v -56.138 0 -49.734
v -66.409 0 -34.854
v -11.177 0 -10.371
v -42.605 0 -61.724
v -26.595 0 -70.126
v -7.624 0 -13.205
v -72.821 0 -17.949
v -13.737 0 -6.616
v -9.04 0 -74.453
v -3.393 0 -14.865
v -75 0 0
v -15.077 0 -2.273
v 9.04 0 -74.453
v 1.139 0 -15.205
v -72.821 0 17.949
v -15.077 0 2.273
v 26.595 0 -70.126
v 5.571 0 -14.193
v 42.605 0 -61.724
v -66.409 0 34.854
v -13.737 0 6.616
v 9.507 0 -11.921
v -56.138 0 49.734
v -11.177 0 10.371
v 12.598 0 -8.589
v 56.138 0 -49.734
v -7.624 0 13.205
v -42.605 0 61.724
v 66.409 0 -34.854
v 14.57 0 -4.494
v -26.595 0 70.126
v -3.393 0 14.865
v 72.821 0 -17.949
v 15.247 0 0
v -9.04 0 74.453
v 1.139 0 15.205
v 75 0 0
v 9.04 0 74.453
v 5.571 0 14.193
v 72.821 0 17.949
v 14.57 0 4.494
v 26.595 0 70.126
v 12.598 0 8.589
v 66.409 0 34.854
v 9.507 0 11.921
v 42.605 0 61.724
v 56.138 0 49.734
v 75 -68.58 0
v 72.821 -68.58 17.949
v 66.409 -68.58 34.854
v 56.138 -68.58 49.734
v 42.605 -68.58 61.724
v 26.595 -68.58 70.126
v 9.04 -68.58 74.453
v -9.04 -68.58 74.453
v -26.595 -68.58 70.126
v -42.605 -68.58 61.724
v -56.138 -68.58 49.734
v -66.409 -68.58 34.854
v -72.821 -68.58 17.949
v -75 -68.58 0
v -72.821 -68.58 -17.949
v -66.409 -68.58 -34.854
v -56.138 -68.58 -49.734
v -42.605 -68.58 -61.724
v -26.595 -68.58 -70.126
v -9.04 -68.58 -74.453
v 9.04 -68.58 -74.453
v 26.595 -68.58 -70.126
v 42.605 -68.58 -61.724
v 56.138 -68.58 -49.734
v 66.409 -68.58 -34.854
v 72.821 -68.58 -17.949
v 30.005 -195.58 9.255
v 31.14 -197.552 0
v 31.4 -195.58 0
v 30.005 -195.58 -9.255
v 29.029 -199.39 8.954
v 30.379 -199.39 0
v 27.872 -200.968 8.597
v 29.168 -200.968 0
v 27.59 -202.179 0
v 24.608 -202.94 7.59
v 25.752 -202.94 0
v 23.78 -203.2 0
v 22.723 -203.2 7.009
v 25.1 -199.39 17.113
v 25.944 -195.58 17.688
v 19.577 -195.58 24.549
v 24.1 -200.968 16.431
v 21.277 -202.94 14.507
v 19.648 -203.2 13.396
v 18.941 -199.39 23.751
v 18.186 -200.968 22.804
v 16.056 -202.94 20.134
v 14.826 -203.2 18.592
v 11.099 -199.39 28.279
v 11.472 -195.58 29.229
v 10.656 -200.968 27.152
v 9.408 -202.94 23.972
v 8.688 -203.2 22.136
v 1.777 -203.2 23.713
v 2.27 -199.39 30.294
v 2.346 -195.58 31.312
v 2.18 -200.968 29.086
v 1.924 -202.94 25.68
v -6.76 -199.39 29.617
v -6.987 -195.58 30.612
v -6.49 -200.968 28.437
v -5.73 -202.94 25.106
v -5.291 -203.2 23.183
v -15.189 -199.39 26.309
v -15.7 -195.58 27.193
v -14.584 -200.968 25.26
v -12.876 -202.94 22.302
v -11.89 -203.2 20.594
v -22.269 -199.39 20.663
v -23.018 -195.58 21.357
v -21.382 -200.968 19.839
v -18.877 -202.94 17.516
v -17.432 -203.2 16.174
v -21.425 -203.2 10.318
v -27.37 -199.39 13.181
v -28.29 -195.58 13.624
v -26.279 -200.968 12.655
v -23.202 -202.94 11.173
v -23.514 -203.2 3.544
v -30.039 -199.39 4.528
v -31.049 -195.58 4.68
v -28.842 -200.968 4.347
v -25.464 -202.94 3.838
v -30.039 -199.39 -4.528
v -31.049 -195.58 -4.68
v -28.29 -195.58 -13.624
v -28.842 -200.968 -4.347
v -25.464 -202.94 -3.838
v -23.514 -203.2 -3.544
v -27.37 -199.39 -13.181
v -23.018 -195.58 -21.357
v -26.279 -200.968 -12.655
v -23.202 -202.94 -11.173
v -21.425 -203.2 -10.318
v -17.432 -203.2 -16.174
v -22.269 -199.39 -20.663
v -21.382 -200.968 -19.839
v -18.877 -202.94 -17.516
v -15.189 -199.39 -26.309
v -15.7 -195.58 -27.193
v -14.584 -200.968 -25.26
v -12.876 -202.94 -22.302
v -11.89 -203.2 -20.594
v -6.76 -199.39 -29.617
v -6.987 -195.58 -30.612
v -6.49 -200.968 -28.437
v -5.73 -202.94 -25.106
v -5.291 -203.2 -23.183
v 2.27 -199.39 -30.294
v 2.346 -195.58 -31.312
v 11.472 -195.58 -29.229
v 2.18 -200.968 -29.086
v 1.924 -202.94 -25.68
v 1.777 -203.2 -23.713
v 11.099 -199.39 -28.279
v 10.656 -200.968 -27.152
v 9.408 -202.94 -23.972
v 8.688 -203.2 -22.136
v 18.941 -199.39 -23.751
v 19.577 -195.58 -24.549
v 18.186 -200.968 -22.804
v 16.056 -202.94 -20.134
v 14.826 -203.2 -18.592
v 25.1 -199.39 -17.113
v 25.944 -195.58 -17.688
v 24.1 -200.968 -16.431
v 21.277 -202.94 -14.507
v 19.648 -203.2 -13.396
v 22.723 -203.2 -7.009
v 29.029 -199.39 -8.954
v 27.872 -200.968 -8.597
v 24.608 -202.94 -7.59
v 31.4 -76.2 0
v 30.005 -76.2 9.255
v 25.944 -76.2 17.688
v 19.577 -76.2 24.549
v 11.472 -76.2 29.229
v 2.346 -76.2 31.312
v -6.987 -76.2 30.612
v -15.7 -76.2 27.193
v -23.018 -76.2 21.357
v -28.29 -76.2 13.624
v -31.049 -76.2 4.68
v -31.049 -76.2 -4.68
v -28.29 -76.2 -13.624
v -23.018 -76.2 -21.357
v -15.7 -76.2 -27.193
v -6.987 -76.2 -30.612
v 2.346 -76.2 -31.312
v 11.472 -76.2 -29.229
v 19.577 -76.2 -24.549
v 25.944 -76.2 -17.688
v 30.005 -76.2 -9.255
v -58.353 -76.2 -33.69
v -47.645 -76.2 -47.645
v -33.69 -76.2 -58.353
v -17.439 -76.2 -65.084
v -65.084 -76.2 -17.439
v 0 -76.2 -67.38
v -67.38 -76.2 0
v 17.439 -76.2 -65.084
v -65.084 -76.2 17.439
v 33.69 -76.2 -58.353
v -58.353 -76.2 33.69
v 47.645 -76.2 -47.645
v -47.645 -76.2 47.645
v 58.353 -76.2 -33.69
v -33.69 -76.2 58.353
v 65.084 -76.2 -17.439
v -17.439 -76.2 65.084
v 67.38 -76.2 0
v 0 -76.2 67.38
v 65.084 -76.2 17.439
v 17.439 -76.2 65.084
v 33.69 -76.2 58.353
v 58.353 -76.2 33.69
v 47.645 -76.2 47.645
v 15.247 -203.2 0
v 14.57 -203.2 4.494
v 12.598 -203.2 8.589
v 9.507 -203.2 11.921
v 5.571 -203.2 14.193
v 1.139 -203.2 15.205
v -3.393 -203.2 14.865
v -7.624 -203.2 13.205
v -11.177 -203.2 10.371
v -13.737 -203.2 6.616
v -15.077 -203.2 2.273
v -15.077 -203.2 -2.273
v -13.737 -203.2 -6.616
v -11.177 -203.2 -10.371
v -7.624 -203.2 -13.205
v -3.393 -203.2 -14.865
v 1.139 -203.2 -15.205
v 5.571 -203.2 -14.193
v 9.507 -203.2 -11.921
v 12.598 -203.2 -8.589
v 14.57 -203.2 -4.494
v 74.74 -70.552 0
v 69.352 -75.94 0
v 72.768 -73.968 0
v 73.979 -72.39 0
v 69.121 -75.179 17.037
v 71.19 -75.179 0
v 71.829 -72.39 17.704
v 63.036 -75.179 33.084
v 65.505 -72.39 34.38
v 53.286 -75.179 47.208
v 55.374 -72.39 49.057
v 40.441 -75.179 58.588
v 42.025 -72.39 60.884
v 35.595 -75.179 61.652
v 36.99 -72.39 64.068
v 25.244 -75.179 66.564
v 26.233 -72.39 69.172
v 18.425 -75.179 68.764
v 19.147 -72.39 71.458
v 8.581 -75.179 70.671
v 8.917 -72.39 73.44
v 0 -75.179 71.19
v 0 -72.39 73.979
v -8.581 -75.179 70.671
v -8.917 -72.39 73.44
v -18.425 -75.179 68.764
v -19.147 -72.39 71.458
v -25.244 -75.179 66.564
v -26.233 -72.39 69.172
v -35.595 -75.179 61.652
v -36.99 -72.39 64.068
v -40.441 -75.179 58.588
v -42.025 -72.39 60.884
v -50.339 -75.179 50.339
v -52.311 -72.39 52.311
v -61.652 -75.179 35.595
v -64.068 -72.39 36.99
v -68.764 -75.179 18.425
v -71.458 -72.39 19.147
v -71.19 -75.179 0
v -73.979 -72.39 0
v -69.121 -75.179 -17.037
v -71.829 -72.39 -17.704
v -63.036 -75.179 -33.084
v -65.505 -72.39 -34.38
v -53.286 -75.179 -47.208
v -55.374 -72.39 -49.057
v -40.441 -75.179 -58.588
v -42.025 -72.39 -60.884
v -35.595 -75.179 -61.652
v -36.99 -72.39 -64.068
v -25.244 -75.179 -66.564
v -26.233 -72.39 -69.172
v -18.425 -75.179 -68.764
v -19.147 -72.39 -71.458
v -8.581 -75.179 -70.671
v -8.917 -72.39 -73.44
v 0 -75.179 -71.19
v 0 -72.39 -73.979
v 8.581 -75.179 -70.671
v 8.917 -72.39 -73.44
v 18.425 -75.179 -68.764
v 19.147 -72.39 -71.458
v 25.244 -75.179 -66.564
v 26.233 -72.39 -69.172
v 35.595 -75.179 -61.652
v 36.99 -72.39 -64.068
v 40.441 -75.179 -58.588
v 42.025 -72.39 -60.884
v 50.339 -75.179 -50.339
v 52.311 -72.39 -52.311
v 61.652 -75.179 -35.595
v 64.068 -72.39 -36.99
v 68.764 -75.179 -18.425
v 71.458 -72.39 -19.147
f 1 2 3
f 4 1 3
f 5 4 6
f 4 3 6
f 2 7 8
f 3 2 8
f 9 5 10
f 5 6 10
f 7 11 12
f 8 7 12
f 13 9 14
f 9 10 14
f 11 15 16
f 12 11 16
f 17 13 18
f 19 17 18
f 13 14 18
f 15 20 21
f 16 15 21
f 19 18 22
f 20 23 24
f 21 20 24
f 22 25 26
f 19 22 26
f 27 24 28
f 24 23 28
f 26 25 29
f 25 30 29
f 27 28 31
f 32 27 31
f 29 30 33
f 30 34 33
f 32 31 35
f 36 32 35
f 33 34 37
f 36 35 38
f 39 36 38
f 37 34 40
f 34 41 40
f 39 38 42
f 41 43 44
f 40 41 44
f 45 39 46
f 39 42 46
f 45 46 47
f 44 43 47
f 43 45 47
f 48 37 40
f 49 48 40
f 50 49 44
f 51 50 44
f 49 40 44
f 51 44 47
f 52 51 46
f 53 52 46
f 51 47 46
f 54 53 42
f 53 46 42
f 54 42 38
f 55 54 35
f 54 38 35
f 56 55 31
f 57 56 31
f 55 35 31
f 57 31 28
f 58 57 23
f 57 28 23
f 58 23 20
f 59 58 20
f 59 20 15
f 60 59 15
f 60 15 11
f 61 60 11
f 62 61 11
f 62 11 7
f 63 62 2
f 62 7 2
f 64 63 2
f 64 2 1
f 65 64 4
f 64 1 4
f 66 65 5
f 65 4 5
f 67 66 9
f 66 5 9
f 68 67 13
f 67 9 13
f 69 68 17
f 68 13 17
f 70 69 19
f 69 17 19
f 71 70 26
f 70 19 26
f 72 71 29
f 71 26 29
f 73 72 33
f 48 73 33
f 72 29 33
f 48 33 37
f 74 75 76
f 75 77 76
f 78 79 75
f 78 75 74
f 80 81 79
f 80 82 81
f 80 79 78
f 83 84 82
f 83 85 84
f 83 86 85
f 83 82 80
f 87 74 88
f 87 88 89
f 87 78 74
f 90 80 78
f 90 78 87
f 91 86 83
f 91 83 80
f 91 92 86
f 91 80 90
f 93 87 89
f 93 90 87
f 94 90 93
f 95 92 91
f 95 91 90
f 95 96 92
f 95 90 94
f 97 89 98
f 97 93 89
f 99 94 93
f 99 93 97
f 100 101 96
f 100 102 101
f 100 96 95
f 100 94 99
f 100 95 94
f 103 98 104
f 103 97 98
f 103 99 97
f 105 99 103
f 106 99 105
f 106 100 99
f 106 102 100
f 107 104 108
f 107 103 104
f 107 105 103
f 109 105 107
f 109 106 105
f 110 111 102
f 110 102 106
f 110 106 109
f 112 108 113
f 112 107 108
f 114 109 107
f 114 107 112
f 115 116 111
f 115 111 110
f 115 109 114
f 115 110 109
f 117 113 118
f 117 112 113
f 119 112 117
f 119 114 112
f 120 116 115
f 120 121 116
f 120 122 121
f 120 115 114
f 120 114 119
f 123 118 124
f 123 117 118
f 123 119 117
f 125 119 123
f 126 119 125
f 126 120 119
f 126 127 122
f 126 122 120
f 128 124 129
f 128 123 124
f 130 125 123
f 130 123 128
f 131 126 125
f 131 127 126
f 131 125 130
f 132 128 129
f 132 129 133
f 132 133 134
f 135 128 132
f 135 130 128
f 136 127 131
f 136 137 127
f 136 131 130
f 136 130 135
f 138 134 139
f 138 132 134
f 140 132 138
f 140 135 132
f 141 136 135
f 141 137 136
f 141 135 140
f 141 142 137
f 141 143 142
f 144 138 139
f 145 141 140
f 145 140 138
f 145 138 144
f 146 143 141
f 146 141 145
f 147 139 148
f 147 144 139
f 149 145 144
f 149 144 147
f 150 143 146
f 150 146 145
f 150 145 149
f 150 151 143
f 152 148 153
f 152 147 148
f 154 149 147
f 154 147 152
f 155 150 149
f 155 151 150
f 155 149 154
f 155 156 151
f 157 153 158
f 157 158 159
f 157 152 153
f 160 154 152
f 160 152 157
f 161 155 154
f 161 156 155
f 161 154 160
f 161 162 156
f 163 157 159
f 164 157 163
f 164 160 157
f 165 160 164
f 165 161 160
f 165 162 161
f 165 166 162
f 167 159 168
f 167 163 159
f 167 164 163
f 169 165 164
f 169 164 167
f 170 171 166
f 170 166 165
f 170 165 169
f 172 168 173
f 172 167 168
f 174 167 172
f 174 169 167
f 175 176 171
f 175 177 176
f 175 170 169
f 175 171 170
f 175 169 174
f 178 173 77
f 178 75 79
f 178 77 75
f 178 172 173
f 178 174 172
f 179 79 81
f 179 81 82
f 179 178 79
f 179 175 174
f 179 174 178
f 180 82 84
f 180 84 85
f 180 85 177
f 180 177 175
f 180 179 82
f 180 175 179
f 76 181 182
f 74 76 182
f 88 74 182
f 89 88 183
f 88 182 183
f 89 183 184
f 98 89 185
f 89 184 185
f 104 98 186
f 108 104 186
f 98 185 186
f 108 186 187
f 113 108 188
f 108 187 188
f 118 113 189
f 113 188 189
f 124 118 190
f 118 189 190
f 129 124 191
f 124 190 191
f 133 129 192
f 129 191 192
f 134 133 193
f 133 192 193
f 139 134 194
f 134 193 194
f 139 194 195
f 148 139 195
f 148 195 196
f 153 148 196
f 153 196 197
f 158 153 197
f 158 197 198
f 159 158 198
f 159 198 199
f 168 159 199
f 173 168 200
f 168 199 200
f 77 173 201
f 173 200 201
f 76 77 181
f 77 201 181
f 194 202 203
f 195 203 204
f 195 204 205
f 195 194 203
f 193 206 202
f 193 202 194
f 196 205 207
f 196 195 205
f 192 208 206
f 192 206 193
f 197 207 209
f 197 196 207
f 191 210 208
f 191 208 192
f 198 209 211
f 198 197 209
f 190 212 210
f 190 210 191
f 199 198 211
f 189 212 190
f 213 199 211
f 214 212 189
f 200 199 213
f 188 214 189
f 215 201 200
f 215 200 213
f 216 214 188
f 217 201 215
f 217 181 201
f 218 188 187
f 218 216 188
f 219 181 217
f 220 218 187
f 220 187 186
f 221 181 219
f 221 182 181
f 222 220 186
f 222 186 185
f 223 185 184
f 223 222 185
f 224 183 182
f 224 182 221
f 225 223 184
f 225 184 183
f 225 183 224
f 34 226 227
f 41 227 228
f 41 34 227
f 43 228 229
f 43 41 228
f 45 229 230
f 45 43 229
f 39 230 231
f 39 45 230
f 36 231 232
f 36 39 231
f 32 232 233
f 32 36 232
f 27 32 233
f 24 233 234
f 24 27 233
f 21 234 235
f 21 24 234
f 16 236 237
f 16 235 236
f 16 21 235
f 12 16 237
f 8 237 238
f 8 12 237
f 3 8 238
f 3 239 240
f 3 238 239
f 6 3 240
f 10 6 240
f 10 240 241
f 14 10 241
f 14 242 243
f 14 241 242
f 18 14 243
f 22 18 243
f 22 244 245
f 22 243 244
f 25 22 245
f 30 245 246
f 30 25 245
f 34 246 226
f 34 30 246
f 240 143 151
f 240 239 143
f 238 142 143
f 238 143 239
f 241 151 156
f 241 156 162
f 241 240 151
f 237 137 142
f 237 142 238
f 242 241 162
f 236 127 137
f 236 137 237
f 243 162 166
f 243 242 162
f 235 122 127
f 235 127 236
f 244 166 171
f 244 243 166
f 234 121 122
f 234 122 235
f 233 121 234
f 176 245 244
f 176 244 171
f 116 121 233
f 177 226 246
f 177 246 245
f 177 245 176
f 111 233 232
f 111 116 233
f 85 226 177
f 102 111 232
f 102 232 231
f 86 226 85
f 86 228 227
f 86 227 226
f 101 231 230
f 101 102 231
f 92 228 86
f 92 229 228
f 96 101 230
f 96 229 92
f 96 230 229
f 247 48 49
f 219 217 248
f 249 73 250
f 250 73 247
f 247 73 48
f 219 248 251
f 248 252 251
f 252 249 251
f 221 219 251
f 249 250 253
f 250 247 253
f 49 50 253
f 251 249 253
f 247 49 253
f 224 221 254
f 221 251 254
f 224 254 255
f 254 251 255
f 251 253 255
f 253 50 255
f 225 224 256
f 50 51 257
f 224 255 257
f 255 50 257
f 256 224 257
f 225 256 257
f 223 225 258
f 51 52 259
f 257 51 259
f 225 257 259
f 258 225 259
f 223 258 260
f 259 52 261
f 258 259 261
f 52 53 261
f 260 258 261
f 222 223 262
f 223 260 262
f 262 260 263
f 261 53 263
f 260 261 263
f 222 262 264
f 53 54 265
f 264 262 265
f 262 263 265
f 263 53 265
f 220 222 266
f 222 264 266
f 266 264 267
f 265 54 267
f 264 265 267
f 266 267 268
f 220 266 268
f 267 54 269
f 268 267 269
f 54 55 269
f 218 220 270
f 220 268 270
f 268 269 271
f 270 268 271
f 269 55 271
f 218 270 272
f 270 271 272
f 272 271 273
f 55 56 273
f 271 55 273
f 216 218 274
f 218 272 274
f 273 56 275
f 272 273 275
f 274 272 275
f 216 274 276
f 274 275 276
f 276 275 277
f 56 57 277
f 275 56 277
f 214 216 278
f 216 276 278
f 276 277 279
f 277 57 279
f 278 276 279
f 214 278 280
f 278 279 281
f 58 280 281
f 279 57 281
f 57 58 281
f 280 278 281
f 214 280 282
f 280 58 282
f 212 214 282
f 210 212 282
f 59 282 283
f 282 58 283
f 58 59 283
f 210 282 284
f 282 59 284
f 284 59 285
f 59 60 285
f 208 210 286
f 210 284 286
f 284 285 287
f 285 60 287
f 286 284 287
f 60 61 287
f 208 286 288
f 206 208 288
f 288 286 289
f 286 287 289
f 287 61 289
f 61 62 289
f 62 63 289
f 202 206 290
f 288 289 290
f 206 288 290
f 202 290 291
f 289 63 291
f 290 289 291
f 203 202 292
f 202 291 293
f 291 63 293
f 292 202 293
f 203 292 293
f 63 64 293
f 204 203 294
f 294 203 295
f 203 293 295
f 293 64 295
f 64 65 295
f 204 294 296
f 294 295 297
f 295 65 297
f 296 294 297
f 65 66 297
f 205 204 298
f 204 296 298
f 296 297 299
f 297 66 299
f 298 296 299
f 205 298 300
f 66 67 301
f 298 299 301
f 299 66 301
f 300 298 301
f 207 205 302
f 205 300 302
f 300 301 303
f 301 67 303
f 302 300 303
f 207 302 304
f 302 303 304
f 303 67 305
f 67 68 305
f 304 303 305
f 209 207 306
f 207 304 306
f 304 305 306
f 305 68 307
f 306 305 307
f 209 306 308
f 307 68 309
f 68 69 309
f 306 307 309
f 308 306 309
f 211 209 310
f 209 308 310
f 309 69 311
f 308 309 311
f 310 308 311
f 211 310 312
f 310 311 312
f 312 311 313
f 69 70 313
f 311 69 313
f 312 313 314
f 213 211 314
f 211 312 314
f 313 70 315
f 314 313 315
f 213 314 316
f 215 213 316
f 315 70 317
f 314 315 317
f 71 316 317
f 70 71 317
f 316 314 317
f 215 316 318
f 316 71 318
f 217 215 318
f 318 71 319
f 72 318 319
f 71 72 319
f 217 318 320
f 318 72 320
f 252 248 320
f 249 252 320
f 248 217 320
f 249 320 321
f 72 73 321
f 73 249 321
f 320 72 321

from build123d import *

# Parameters (mm, degrees)
F0_R      = 75
F1_DEPTH  = 76.2
F2_R      = 31.399649
F3_DEPTH  = 127
F3_FACE_R = 31.399649
F4_R      = 15.247419
F5_DEPTH  = 331.978
F6_R      = 7.62
F7_R      = 7.62


with BuildPart() as f1:
    # F0 (on Front) → F1 (new body)
    with BuildSketch(Plane.XZ):
        Circle(F0_R)
    extrude(amount=F1_DEPTH)

    # F2 (on face) → F3 (join)
    with BuildSketch(Plane.XZ.offset(76.2)):
        Circle(F2_R)
    extrude(amount=F3_DEPTH)

    # F3_face (on face) + F4 (on Front) → F5 (cut)
    with BuildSketch(Plane.XZ.offset(203.2)):
        Circle(F3_FACE_R)
    with BuildSketch(Plane.XZ):
        Circle(F4_R)
    extrude(amount=F5_DEPTH, mode=Mode.SUBTRACT)

    # F6
    f6_edges = [f1.edges().sort_by_distance(p)[0] for p in [
        (-31.399649, -203.2, 0),
    ]]
    fillet(f6_edges, radius=F6_R)

    # F7
    f7_edges = [f1.edges().sort_by_distance(p)[0] for p in [
        (-75, -76.2, 0),
    ]]
    fillet(f7_edges, radius=F7_R)


solid = f1.part
